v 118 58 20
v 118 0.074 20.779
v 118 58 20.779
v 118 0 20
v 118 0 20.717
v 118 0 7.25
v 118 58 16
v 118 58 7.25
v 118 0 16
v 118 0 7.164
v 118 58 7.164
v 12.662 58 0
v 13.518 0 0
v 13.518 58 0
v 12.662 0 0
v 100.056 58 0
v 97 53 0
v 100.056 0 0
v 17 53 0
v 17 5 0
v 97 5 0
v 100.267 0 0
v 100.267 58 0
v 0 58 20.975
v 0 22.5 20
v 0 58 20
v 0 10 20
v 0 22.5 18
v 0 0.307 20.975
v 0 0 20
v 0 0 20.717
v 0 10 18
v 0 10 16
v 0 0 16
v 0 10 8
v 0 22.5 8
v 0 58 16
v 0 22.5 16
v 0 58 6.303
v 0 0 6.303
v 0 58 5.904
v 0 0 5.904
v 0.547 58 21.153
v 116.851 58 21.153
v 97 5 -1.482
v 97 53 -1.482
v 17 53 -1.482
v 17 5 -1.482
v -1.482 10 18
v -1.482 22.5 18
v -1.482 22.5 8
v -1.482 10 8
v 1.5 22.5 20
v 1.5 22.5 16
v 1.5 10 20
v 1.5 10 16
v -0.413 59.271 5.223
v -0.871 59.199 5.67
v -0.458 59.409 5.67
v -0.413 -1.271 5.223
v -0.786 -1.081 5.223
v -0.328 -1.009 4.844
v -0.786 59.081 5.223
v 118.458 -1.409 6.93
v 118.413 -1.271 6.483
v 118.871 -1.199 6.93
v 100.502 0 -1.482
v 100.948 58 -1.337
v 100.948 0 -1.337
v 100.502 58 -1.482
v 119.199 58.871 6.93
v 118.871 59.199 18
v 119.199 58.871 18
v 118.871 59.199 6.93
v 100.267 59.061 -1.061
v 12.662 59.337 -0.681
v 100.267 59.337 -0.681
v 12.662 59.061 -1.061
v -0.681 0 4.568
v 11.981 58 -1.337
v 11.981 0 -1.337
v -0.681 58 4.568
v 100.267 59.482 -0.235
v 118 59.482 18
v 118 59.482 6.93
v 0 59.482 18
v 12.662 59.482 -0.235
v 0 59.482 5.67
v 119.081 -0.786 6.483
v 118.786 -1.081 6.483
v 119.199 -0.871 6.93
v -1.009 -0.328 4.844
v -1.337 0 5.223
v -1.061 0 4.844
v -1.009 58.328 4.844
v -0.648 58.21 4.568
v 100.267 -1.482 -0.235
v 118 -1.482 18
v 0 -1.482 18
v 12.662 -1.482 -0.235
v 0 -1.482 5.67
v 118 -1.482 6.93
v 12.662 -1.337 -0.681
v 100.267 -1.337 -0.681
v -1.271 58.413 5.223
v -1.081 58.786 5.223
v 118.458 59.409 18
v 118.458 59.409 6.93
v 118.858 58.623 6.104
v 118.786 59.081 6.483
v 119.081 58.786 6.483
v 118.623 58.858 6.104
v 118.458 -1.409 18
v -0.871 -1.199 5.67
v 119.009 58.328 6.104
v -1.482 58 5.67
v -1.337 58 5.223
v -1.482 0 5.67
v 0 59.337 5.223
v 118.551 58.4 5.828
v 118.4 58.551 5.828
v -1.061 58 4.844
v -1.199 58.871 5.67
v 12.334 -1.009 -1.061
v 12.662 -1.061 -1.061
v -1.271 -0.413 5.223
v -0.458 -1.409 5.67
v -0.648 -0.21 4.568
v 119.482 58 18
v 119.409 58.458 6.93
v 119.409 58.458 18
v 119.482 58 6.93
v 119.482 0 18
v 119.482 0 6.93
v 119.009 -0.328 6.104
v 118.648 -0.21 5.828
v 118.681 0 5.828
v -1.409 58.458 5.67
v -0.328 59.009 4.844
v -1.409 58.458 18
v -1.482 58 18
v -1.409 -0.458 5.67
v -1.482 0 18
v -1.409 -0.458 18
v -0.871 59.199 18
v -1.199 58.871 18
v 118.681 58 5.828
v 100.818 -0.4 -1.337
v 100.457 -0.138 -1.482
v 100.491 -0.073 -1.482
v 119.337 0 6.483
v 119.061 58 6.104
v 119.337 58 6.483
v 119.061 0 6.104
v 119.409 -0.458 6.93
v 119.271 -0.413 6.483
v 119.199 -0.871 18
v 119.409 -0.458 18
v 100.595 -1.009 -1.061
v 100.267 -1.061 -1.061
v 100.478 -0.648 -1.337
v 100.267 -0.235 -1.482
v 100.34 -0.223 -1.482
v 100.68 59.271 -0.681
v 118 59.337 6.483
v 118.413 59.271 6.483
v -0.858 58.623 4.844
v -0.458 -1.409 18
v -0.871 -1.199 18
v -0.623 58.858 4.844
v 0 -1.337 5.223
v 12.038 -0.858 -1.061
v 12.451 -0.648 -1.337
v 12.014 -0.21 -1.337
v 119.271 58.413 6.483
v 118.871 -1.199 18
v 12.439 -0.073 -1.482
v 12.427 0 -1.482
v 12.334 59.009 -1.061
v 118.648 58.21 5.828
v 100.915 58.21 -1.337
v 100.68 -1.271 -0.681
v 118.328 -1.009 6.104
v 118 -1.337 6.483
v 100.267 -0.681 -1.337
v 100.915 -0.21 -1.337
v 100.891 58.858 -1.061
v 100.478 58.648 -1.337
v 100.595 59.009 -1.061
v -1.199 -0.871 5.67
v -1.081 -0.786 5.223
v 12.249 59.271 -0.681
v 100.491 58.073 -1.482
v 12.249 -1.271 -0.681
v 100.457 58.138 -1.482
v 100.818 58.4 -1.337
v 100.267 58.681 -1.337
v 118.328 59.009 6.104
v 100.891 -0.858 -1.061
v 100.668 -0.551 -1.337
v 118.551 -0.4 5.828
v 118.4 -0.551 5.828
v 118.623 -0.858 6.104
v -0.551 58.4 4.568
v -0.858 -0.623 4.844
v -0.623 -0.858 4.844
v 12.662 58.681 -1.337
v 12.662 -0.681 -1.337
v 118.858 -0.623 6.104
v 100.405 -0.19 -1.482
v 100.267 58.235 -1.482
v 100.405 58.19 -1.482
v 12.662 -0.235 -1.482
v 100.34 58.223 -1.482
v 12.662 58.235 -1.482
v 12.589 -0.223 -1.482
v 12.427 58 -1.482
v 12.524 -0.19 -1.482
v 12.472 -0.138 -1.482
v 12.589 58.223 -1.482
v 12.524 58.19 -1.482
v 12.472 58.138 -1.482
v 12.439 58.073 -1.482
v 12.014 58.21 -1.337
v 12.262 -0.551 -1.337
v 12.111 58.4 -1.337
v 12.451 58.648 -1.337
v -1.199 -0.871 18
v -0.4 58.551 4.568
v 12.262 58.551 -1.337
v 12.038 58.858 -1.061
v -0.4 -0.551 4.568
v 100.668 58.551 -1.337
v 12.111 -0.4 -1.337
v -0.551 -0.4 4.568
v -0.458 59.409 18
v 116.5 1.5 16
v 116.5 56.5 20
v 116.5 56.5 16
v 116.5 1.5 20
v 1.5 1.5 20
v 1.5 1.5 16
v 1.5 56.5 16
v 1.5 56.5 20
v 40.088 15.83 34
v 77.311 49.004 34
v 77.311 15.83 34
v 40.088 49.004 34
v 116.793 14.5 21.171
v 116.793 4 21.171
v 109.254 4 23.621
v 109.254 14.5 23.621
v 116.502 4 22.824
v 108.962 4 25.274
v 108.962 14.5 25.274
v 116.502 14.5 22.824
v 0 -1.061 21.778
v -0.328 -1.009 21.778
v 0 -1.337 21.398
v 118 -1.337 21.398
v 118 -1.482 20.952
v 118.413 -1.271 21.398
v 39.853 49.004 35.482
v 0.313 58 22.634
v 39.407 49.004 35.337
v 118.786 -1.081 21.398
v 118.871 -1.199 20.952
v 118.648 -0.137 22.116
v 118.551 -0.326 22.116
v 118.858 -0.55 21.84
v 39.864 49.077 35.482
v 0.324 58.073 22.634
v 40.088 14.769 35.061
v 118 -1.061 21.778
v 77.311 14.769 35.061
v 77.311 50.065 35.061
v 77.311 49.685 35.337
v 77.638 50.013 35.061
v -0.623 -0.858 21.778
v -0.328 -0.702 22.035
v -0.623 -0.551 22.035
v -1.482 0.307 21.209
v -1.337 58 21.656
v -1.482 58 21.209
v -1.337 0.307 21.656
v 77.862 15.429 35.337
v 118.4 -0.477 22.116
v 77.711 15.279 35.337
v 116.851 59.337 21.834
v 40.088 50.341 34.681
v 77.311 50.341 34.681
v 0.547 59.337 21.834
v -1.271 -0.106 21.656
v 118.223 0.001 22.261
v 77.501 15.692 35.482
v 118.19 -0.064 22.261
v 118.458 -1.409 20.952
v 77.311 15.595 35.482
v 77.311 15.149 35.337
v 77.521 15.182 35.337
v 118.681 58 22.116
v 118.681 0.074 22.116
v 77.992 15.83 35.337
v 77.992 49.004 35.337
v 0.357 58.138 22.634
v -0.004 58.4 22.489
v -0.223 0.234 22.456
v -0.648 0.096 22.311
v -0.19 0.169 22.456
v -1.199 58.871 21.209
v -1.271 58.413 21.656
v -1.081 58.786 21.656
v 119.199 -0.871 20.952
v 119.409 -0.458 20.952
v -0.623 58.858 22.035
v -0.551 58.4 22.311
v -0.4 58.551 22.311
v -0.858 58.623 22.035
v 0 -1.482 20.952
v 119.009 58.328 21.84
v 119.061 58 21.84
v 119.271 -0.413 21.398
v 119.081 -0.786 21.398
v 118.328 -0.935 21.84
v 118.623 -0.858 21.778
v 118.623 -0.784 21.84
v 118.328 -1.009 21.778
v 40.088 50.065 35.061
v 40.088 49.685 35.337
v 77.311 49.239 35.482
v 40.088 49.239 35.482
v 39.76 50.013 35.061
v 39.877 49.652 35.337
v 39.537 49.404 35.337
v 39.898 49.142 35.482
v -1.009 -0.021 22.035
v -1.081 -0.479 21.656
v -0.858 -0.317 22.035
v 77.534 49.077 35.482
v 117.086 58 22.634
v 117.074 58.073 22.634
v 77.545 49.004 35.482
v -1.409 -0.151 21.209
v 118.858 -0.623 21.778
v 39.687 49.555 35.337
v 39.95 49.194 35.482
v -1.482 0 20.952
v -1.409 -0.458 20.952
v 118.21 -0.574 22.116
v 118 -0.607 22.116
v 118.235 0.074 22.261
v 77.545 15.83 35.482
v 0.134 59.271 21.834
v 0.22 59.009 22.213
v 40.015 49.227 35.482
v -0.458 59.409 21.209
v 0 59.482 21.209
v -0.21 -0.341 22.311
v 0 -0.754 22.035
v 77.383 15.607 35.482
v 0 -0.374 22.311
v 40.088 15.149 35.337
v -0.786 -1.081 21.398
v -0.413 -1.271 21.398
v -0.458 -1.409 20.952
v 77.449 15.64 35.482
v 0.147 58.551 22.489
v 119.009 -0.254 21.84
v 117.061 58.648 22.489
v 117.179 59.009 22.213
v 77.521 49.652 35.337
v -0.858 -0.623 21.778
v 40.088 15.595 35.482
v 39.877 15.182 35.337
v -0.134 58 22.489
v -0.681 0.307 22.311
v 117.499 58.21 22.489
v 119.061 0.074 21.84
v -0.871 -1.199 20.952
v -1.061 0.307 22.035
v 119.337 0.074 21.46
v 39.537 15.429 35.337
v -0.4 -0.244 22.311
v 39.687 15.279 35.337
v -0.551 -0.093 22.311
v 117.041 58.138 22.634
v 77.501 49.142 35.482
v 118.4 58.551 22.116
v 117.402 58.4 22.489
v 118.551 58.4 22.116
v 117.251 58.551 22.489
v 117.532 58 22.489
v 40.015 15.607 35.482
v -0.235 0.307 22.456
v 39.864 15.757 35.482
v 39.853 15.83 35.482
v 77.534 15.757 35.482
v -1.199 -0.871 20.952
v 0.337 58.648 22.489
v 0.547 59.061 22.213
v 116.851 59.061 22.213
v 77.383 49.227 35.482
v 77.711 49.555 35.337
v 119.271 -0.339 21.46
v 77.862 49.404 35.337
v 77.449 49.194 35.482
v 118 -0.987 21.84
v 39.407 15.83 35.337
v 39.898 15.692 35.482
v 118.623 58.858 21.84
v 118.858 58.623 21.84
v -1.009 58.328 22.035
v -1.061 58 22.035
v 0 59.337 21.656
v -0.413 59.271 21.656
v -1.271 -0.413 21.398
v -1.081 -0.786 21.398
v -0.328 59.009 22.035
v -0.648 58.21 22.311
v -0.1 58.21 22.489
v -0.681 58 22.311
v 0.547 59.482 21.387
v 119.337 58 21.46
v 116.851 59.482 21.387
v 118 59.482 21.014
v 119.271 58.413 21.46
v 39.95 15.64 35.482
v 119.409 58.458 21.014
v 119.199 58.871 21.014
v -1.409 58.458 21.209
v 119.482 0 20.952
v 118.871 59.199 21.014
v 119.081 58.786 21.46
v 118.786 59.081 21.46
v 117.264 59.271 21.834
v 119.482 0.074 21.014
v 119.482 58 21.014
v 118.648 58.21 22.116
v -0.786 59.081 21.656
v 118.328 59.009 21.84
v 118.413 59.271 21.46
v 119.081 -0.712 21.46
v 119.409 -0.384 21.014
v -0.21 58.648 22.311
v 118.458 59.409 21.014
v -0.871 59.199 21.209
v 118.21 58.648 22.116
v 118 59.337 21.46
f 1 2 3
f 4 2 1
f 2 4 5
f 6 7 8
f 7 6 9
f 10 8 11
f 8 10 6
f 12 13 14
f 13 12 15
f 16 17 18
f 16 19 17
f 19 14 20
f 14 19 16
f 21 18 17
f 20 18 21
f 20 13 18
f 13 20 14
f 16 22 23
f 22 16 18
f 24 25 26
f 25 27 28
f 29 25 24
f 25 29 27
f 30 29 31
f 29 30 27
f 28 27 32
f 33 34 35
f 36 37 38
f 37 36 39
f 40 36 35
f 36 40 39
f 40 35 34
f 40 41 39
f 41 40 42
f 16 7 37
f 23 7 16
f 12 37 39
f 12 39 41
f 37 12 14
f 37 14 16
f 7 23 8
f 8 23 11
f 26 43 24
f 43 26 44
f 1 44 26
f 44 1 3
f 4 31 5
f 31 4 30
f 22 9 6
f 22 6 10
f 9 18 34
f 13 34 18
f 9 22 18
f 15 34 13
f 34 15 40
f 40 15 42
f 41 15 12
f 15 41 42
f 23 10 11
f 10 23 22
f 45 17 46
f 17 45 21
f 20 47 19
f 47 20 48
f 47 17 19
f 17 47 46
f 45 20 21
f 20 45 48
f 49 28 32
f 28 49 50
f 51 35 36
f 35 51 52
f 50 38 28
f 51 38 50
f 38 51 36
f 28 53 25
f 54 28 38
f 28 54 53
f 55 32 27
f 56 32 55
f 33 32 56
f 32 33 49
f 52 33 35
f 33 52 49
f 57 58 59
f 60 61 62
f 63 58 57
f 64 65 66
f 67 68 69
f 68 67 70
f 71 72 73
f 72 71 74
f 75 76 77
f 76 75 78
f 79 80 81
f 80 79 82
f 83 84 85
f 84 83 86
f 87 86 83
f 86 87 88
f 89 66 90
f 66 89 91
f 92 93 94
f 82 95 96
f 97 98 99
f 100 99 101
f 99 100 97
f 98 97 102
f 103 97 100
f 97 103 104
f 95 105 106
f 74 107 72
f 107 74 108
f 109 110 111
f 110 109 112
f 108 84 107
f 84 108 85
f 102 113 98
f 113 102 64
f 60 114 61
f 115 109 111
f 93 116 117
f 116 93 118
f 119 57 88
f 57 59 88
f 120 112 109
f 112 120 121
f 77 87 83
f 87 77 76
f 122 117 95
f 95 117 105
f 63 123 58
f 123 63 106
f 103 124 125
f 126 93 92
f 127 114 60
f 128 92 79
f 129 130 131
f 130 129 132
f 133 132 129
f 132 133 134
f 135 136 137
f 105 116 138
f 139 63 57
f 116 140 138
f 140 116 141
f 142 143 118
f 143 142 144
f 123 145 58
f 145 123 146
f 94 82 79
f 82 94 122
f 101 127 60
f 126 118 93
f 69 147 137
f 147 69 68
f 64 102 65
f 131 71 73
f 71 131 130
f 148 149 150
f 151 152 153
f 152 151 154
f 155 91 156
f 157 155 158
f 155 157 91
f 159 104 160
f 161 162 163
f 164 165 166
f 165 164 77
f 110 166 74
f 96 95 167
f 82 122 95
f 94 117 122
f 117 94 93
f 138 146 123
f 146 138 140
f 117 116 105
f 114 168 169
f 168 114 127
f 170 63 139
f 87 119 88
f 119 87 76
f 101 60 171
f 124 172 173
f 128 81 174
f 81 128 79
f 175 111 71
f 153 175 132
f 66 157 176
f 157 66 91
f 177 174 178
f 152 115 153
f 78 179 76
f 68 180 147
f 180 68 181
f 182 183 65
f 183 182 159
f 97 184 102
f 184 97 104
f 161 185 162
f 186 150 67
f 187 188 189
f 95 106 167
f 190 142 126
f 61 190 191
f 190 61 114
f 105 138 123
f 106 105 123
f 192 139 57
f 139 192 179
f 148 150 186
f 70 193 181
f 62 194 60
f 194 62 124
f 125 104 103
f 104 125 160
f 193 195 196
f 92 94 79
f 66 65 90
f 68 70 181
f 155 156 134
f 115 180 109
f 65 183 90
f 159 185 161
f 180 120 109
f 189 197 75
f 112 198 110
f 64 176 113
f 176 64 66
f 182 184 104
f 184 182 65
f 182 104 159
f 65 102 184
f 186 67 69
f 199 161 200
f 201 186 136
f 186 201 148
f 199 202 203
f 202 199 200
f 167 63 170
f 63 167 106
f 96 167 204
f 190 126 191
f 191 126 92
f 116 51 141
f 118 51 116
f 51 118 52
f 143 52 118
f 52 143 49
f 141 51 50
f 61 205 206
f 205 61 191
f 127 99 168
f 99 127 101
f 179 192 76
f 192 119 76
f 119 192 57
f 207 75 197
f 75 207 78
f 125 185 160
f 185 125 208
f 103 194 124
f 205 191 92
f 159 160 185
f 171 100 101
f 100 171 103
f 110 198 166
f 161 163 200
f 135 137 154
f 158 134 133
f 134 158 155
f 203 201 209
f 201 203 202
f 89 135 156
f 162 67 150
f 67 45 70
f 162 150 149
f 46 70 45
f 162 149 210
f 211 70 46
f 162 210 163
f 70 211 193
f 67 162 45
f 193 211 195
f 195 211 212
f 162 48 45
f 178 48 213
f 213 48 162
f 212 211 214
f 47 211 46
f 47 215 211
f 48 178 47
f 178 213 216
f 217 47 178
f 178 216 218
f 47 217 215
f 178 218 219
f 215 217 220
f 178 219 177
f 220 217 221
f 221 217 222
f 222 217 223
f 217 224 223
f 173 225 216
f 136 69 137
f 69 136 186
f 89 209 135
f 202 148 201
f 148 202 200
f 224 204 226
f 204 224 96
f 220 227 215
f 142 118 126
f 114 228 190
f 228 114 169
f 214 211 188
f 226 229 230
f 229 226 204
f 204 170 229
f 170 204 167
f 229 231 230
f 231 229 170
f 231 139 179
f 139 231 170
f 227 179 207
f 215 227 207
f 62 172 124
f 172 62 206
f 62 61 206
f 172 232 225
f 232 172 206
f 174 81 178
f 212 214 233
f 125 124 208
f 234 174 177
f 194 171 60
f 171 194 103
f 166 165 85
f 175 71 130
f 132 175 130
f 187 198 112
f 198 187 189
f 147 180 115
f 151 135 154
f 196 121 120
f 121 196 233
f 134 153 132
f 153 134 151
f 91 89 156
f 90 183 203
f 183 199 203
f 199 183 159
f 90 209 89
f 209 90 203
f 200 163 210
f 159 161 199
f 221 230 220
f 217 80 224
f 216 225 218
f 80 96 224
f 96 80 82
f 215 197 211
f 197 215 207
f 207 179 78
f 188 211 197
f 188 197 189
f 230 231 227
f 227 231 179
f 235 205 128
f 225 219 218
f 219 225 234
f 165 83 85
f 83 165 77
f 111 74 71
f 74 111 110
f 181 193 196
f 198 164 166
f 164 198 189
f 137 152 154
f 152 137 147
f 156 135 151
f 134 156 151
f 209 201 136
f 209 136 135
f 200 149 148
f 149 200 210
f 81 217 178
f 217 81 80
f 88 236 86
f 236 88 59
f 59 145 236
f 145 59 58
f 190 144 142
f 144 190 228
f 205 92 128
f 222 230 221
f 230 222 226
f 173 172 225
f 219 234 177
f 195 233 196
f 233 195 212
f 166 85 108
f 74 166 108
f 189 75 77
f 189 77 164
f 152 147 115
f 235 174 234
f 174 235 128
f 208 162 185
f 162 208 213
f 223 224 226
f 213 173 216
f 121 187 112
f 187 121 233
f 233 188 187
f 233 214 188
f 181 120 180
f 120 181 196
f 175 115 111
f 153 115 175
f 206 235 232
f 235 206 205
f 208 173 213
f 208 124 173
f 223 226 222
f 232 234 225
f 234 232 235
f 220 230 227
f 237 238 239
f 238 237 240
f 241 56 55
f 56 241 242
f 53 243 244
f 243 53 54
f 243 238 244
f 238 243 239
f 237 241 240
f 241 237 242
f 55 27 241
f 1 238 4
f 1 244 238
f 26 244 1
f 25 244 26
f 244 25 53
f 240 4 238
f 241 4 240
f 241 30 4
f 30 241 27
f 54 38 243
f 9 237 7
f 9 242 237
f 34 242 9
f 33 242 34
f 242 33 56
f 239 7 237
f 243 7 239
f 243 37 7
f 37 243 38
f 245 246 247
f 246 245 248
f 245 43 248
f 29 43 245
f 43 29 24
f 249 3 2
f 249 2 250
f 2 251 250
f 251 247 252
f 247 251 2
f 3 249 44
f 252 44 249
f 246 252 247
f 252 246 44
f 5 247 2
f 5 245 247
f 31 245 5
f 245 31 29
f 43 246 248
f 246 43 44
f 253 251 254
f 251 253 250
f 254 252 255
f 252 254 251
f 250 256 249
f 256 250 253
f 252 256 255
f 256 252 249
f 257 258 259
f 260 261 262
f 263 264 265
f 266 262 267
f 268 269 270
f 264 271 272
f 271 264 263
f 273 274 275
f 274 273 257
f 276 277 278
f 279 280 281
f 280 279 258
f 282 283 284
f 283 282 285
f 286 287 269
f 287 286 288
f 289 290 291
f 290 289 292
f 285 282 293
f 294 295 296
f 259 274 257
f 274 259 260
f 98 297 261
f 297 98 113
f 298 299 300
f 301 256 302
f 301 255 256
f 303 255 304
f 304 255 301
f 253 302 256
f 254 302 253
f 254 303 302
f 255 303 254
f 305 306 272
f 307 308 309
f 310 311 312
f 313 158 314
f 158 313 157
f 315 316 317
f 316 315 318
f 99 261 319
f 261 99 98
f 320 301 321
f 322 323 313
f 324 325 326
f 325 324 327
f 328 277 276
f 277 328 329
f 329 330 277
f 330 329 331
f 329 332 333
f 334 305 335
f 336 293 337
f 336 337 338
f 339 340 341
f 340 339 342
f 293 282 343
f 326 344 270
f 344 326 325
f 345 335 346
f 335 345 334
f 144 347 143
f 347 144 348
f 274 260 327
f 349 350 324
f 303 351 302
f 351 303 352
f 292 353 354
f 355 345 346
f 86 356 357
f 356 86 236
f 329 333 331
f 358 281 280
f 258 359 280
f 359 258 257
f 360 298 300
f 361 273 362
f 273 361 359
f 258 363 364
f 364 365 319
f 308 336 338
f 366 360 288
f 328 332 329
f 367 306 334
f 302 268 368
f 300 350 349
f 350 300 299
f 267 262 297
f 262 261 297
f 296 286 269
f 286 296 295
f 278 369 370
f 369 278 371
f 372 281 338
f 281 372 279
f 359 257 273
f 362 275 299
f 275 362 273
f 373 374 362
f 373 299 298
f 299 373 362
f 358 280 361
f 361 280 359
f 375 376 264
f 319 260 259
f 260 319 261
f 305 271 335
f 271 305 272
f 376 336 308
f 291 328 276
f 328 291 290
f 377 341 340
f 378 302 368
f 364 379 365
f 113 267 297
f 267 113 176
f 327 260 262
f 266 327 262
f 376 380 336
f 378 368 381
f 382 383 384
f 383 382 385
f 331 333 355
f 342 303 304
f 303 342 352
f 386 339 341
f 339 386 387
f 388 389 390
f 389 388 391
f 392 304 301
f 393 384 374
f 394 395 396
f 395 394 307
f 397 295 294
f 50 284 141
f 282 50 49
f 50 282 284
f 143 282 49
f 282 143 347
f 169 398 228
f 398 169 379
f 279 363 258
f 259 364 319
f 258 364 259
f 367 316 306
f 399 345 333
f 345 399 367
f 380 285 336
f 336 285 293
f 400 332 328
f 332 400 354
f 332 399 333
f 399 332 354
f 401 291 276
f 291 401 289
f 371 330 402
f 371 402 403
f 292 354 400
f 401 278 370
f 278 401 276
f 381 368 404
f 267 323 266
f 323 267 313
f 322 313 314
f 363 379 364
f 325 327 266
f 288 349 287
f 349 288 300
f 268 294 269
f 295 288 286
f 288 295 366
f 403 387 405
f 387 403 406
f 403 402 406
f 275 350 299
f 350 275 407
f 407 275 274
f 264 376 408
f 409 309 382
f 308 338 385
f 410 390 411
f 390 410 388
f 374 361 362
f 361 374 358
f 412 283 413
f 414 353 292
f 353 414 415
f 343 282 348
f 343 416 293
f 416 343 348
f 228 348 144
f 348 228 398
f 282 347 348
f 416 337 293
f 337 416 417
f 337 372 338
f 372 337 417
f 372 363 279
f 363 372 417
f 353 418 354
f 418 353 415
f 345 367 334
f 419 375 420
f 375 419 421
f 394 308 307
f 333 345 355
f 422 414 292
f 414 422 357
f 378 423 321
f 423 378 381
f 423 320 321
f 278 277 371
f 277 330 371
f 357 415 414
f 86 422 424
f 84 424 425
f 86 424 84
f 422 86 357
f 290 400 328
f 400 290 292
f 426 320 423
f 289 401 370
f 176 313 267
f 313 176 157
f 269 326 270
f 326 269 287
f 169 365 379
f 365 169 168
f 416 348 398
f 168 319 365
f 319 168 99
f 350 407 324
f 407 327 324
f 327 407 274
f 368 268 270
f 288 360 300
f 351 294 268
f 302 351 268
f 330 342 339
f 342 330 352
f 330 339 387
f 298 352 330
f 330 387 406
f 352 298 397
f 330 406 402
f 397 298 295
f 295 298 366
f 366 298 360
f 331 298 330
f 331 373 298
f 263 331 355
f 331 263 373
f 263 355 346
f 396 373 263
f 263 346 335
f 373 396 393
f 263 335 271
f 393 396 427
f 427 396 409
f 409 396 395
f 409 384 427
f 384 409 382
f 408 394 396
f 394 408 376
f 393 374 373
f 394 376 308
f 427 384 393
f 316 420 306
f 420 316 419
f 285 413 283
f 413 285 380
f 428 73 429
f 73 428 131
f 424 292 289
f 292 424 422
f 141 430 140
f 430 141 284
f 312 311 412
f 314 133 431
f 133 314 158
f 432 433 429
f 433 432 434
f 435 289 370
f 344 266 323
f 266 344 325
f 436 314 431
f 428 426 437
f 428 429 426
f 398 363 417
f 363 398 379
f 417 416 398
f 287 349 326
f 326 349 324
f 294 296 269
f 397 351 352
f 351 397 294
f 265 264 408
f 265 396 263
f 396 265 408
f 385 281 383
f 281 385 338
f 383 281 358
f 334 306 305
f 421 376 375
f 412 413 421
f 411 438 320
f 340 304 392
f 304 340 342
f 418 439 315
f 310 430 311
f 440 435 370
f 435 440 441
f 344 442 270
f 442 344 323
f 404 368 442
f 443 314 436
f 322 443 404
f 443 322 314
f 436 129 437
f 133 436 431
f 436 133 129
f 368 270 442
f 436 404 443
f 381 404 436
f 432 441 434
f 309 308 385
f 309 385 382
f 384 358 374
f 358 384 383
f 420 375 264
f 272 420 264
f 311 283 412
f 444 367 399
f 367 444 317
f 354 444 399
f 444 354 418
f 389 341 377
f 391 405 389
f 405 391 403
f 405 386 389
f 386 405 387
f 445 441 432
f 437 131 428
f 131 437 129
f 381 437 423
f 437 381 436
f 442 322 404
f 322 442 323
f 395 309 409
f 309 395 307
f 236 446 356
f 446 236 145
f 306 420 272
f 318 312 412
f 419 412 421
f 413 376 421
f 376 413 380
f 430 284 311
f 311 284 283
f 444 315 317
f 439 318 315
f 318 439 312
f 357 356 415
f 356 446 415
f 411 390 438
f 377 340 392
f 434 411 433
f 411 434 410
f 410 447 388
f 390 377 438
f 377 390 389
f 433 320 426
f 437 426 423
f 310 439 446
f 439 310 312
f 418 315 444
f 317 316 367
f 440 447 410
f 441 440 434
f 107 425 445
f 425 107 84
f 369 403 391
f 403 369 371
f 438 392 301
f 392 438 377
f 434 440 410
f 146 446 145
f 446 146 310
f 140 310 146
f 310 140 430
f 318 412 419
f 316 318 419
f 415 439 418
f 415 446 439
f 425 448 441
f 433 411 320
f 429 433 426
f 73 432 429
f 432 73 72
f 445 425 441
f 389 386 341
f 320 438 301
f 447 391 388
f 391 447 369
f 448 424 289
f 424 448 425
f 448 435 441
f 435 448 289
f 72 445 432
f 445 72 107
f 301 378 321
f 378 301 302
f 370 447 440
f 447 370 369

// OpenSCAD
$fn=20;

epsParoie = 1.5;
epsParoie2 = 2*epsParoie;


piece1();

piece2();



module piece2(){
    color("silver")difference(){
        minkowski() {
            backBox();
            sphere(epsParoie);
        }
        union(){
            translate([0,0,0]) backBox();
            translate([-3,-3,14]) cube([125,65,4]);
            translate([117,4,20]) rotate([-10,0,90]) cube([10.5,7,10]);
        }
    }
}
module backBox(){
    difference(){
    union(){
            translate([0,0,17]) cube([115+epsParoie2,55+epsParoie2,17]);  
        }
        translate([-3,-3,20]) rotate([0,-18,0]) cube([60,65,16]); 
        translate([65,-3,38]) rotate([0,18,0]) cube([60,65,16]); 
        
        translate([-3,-3,18.2]) rotate([40,0,0]) cube([130,65,16]); 
        translate([-3,35,54]) rotate([-55,0,0]) cube([130,65,16]); 
    }
}


module piece1(){
    color("silver")difference(){
            minkowski() {
                              
                fontBox();
                sphere(epsParoie);
            }
             

    union(){
        translate([0,0,0]) fontBox();
        translate([17,epsParoie+3.5,-2]) cube([80,48,8]);
        translate([-10, -10,18]) cube([140,80,10]);  
        connecter();
        }
        
    }
    difference(){
        translate([0,0,16]) cube([115+epsParoie2,55+epsParoie2,4]); 
        union(){
            connecter();
            translate([epsParoie,epsParoie,15]) cube([115,55,6]); 
        }
    }
}
         
module connecter(){
    translate([-5, 10,8]) cube([10,12.5,12.1]);
}    
module fontBox(){
    
    difference(){
        union(){
            translate([0,0,0]) cube([115+epsParoie2,55+epsParoie2,20]);             
        }
        union(){            
            translate([-8, -1,-1]) rotate([0,25,0]) cube([25,55+5,10]);  
            translate([102, -1,-10]) rotate([0,-22,0]) cube([25,55+5,10]); 
        }
    }
    difference(){
        union(){
            translate([-12, 0,10+epsParoie]) rotate([0,25,0]) translate([10, 0,0]) cube([20,55+epsParoie2,epsParoie]);  
            translate([102, 0,epsParoie-0.8]) rotate([0,-22,0]) translate([-5, 0,0]) cube([25,55+epsParoie2,epsParoie]);  
        }
        union(){
            translate([10, -1,-2]) cube([100,60,2]);
            translate([-5, -1,0]) cube([5,60,20]);
            translate([115+epsParoie2, -1,0]) cube([5,60,20]);
        }
    }
}
